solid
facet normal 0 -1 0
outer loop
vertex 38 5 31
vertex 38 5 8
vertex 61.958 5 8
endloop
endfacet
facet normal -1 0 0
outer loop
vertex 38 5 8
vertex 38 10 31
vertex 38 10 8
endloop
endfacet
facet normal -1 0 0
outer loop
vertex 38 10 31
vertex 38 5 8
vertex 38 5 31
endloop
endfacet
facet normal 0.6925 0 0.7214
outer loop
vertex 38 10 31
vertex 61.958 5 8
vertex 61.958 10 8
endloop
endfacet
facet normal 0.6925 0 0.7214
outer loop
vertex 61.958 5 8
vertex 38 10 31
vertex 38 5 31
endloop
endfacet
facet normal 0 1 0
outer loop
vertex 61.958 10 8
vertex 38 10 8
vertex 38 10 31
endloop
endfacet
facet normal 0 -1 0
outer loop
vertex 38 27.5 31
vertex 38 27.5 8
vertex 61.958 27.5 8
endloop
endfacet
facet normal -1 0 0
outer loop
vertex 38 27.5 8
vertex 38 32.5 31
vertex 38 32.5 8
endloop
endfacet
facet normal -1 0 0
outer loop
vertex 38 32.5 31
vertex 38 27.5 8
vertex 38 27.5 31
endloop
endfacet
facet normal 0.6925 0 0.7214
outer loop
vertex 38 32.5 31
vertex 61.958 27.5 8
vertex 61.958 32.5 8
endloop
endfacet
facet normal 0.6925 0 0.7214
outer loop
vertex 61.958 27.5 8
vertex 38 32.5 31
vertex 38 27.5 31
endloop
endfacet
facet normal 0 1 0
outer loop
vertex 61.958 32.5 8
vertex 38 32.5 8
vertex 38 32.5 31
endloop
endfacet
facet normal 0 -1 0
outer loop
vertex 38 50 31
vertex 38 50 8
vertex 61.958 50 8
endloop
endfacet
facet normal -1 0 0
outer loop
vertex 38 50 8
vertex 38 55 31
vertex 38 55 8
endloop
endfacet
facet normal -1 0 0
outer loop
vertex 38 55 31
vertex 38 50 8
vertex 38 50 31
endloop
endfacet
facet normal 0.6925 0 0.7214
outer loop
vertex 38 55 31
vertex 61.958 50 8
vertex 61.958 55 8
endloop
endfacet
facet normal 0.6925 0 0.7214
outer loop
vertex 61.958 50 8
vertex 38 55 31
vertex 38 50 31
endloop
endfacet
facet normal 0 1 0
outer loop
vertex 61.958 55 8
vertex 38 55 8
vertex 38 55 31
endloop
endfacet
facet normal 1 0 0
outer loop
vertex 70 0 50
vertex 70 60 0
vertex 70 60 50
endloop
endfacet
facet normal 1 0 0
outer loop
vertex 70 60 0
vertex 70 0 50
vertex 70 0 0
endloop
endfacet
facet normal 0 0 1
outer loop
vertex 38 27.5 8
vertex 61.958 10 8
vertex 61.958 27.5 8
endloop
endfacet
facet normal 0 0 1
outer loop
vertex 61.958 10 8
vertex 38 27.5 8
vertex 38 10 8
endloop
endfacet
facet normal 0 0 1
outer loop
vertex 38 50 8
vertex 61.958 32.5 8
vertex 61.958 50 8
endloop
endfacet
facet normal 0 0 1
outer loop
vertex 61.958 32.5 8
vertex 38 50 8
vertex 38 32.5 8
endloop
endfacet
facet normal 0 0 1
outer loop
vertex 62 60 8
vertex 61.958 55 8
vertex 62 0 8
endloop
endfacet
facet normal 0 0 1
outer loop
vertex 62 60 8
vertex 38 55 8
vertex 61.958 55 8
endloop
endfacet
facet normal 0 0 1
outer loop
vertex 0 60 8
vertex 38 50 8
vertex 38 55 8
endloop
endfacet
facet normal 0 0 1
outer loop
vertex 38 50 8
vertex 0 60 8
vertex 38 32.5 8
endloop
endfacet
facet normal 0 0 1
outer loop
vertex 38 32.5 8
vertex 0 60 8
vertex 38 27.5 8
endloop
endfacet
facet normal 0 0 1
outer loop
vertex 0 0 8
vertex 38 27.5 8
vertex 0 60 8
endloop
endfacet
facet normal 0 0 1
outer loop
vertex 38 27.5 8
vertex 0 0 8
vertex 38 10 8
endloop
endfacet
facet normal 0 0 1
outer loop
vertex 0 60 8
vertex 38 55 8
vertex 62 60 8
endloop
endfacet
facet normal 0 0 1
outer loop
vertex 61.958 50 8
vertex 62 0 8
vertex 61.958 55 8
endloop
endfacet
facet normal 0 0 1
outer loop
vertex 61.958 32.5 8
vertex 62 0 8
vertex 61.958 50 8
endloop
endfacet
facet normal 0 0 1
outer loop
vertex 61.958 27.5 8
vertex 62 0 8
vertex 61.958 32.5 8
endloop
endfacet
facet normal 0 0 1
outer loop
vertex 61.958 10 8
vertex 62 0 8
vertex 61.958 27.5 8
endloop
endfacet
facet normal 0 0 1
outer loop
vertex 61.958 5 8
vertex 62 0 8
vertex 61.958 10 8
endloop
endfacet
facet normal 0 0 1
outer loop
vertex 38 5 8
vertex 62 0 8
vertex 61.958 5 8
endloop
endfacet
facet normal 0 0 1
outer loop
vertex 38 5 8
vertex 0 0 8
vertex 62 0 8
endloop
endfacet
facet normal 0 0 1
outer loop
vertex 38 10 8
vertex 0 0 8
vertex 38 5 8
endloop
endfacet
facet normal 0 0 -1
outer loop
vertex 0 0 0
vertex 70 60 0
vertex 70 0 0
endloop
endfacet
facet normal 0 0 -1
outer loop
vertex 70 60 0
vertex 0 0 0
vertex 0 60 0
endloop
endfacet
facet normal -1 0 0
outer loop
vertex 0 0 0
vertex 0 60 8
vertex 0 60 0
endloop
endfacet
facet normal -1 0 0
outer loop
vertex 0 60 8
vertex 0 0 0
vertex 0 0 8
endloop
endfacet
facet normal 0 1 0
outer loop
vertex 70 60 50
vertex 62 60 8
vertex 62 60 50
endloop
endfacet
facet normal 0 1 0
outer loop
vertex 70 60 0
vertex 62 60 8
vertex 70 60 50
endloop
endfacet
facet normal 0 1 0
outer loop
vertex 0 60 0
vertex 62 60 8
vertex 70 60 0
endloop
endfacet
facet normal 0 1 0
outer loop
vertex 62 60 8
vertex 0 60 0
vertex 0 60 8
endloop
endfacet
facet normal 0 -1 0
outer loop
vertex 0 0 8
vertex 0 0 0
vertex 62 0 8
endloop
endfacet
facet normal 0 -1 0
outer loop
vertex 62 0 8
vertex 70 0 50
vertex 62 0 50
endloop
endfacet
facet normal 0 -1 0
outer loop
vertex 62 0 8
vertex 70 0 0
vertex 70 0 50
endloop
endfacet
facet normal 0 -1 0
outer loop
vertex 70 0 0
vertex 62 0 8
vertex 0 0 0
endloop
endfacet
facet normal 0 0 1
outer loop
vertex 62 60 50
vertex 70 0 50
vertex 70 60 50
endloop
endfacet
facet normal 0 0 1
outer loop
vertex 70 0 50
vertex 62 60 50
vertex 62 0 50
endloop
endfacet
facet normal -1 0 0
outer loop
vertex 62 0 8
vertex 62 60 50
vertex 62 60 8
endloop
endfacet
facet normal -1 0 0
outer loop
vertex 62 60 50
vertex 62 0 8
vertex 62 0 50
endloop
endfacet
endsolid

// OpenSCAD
$fn = 32;

// ----------------------------------------------------------------------
// Rib bracket: 3-gusset L bracket
// ----------------------------------------------------------------------

// --- parameters (mm) ---
base_l = 70;              // foot length, X
base_w = 60;              // foot width, Y
base_t = 8;               // foot thickness
plate_t = 8;              // upright plate thickness
plate_h = 50;             // overall height
gus_l = 24;               // gusset leg along the foot
gus_h = 24;               // gusset height
gus_t = 5;                // gusset thickness
gus_edge = 5;             // gusset margin from the foot edge
n_gus = 3;                // gusset count

gus_pitch = (base_w - 2 * gus_edge - gus_t) / (n_gus - 1);  // gusset pitch

union() {
  cube([base_l, base_w, base_t]);
  translate([base_l - plate_t, 0, base_t - 1])
    cube([plate_t, base_w, plate_h - base_t + 1]);
  for (i = [0 : n_gus - 1])
    translate([base_l - plate_t - gus_l, gus_edge + i * gus_pitch, base_t - 1])
      rotate([-90, 0, 0])
        linear_extrude(height = gus_t)
          polygon(points = [[0, 0], [gus_l + 1, 0], [0, -gus_h]]);
}
